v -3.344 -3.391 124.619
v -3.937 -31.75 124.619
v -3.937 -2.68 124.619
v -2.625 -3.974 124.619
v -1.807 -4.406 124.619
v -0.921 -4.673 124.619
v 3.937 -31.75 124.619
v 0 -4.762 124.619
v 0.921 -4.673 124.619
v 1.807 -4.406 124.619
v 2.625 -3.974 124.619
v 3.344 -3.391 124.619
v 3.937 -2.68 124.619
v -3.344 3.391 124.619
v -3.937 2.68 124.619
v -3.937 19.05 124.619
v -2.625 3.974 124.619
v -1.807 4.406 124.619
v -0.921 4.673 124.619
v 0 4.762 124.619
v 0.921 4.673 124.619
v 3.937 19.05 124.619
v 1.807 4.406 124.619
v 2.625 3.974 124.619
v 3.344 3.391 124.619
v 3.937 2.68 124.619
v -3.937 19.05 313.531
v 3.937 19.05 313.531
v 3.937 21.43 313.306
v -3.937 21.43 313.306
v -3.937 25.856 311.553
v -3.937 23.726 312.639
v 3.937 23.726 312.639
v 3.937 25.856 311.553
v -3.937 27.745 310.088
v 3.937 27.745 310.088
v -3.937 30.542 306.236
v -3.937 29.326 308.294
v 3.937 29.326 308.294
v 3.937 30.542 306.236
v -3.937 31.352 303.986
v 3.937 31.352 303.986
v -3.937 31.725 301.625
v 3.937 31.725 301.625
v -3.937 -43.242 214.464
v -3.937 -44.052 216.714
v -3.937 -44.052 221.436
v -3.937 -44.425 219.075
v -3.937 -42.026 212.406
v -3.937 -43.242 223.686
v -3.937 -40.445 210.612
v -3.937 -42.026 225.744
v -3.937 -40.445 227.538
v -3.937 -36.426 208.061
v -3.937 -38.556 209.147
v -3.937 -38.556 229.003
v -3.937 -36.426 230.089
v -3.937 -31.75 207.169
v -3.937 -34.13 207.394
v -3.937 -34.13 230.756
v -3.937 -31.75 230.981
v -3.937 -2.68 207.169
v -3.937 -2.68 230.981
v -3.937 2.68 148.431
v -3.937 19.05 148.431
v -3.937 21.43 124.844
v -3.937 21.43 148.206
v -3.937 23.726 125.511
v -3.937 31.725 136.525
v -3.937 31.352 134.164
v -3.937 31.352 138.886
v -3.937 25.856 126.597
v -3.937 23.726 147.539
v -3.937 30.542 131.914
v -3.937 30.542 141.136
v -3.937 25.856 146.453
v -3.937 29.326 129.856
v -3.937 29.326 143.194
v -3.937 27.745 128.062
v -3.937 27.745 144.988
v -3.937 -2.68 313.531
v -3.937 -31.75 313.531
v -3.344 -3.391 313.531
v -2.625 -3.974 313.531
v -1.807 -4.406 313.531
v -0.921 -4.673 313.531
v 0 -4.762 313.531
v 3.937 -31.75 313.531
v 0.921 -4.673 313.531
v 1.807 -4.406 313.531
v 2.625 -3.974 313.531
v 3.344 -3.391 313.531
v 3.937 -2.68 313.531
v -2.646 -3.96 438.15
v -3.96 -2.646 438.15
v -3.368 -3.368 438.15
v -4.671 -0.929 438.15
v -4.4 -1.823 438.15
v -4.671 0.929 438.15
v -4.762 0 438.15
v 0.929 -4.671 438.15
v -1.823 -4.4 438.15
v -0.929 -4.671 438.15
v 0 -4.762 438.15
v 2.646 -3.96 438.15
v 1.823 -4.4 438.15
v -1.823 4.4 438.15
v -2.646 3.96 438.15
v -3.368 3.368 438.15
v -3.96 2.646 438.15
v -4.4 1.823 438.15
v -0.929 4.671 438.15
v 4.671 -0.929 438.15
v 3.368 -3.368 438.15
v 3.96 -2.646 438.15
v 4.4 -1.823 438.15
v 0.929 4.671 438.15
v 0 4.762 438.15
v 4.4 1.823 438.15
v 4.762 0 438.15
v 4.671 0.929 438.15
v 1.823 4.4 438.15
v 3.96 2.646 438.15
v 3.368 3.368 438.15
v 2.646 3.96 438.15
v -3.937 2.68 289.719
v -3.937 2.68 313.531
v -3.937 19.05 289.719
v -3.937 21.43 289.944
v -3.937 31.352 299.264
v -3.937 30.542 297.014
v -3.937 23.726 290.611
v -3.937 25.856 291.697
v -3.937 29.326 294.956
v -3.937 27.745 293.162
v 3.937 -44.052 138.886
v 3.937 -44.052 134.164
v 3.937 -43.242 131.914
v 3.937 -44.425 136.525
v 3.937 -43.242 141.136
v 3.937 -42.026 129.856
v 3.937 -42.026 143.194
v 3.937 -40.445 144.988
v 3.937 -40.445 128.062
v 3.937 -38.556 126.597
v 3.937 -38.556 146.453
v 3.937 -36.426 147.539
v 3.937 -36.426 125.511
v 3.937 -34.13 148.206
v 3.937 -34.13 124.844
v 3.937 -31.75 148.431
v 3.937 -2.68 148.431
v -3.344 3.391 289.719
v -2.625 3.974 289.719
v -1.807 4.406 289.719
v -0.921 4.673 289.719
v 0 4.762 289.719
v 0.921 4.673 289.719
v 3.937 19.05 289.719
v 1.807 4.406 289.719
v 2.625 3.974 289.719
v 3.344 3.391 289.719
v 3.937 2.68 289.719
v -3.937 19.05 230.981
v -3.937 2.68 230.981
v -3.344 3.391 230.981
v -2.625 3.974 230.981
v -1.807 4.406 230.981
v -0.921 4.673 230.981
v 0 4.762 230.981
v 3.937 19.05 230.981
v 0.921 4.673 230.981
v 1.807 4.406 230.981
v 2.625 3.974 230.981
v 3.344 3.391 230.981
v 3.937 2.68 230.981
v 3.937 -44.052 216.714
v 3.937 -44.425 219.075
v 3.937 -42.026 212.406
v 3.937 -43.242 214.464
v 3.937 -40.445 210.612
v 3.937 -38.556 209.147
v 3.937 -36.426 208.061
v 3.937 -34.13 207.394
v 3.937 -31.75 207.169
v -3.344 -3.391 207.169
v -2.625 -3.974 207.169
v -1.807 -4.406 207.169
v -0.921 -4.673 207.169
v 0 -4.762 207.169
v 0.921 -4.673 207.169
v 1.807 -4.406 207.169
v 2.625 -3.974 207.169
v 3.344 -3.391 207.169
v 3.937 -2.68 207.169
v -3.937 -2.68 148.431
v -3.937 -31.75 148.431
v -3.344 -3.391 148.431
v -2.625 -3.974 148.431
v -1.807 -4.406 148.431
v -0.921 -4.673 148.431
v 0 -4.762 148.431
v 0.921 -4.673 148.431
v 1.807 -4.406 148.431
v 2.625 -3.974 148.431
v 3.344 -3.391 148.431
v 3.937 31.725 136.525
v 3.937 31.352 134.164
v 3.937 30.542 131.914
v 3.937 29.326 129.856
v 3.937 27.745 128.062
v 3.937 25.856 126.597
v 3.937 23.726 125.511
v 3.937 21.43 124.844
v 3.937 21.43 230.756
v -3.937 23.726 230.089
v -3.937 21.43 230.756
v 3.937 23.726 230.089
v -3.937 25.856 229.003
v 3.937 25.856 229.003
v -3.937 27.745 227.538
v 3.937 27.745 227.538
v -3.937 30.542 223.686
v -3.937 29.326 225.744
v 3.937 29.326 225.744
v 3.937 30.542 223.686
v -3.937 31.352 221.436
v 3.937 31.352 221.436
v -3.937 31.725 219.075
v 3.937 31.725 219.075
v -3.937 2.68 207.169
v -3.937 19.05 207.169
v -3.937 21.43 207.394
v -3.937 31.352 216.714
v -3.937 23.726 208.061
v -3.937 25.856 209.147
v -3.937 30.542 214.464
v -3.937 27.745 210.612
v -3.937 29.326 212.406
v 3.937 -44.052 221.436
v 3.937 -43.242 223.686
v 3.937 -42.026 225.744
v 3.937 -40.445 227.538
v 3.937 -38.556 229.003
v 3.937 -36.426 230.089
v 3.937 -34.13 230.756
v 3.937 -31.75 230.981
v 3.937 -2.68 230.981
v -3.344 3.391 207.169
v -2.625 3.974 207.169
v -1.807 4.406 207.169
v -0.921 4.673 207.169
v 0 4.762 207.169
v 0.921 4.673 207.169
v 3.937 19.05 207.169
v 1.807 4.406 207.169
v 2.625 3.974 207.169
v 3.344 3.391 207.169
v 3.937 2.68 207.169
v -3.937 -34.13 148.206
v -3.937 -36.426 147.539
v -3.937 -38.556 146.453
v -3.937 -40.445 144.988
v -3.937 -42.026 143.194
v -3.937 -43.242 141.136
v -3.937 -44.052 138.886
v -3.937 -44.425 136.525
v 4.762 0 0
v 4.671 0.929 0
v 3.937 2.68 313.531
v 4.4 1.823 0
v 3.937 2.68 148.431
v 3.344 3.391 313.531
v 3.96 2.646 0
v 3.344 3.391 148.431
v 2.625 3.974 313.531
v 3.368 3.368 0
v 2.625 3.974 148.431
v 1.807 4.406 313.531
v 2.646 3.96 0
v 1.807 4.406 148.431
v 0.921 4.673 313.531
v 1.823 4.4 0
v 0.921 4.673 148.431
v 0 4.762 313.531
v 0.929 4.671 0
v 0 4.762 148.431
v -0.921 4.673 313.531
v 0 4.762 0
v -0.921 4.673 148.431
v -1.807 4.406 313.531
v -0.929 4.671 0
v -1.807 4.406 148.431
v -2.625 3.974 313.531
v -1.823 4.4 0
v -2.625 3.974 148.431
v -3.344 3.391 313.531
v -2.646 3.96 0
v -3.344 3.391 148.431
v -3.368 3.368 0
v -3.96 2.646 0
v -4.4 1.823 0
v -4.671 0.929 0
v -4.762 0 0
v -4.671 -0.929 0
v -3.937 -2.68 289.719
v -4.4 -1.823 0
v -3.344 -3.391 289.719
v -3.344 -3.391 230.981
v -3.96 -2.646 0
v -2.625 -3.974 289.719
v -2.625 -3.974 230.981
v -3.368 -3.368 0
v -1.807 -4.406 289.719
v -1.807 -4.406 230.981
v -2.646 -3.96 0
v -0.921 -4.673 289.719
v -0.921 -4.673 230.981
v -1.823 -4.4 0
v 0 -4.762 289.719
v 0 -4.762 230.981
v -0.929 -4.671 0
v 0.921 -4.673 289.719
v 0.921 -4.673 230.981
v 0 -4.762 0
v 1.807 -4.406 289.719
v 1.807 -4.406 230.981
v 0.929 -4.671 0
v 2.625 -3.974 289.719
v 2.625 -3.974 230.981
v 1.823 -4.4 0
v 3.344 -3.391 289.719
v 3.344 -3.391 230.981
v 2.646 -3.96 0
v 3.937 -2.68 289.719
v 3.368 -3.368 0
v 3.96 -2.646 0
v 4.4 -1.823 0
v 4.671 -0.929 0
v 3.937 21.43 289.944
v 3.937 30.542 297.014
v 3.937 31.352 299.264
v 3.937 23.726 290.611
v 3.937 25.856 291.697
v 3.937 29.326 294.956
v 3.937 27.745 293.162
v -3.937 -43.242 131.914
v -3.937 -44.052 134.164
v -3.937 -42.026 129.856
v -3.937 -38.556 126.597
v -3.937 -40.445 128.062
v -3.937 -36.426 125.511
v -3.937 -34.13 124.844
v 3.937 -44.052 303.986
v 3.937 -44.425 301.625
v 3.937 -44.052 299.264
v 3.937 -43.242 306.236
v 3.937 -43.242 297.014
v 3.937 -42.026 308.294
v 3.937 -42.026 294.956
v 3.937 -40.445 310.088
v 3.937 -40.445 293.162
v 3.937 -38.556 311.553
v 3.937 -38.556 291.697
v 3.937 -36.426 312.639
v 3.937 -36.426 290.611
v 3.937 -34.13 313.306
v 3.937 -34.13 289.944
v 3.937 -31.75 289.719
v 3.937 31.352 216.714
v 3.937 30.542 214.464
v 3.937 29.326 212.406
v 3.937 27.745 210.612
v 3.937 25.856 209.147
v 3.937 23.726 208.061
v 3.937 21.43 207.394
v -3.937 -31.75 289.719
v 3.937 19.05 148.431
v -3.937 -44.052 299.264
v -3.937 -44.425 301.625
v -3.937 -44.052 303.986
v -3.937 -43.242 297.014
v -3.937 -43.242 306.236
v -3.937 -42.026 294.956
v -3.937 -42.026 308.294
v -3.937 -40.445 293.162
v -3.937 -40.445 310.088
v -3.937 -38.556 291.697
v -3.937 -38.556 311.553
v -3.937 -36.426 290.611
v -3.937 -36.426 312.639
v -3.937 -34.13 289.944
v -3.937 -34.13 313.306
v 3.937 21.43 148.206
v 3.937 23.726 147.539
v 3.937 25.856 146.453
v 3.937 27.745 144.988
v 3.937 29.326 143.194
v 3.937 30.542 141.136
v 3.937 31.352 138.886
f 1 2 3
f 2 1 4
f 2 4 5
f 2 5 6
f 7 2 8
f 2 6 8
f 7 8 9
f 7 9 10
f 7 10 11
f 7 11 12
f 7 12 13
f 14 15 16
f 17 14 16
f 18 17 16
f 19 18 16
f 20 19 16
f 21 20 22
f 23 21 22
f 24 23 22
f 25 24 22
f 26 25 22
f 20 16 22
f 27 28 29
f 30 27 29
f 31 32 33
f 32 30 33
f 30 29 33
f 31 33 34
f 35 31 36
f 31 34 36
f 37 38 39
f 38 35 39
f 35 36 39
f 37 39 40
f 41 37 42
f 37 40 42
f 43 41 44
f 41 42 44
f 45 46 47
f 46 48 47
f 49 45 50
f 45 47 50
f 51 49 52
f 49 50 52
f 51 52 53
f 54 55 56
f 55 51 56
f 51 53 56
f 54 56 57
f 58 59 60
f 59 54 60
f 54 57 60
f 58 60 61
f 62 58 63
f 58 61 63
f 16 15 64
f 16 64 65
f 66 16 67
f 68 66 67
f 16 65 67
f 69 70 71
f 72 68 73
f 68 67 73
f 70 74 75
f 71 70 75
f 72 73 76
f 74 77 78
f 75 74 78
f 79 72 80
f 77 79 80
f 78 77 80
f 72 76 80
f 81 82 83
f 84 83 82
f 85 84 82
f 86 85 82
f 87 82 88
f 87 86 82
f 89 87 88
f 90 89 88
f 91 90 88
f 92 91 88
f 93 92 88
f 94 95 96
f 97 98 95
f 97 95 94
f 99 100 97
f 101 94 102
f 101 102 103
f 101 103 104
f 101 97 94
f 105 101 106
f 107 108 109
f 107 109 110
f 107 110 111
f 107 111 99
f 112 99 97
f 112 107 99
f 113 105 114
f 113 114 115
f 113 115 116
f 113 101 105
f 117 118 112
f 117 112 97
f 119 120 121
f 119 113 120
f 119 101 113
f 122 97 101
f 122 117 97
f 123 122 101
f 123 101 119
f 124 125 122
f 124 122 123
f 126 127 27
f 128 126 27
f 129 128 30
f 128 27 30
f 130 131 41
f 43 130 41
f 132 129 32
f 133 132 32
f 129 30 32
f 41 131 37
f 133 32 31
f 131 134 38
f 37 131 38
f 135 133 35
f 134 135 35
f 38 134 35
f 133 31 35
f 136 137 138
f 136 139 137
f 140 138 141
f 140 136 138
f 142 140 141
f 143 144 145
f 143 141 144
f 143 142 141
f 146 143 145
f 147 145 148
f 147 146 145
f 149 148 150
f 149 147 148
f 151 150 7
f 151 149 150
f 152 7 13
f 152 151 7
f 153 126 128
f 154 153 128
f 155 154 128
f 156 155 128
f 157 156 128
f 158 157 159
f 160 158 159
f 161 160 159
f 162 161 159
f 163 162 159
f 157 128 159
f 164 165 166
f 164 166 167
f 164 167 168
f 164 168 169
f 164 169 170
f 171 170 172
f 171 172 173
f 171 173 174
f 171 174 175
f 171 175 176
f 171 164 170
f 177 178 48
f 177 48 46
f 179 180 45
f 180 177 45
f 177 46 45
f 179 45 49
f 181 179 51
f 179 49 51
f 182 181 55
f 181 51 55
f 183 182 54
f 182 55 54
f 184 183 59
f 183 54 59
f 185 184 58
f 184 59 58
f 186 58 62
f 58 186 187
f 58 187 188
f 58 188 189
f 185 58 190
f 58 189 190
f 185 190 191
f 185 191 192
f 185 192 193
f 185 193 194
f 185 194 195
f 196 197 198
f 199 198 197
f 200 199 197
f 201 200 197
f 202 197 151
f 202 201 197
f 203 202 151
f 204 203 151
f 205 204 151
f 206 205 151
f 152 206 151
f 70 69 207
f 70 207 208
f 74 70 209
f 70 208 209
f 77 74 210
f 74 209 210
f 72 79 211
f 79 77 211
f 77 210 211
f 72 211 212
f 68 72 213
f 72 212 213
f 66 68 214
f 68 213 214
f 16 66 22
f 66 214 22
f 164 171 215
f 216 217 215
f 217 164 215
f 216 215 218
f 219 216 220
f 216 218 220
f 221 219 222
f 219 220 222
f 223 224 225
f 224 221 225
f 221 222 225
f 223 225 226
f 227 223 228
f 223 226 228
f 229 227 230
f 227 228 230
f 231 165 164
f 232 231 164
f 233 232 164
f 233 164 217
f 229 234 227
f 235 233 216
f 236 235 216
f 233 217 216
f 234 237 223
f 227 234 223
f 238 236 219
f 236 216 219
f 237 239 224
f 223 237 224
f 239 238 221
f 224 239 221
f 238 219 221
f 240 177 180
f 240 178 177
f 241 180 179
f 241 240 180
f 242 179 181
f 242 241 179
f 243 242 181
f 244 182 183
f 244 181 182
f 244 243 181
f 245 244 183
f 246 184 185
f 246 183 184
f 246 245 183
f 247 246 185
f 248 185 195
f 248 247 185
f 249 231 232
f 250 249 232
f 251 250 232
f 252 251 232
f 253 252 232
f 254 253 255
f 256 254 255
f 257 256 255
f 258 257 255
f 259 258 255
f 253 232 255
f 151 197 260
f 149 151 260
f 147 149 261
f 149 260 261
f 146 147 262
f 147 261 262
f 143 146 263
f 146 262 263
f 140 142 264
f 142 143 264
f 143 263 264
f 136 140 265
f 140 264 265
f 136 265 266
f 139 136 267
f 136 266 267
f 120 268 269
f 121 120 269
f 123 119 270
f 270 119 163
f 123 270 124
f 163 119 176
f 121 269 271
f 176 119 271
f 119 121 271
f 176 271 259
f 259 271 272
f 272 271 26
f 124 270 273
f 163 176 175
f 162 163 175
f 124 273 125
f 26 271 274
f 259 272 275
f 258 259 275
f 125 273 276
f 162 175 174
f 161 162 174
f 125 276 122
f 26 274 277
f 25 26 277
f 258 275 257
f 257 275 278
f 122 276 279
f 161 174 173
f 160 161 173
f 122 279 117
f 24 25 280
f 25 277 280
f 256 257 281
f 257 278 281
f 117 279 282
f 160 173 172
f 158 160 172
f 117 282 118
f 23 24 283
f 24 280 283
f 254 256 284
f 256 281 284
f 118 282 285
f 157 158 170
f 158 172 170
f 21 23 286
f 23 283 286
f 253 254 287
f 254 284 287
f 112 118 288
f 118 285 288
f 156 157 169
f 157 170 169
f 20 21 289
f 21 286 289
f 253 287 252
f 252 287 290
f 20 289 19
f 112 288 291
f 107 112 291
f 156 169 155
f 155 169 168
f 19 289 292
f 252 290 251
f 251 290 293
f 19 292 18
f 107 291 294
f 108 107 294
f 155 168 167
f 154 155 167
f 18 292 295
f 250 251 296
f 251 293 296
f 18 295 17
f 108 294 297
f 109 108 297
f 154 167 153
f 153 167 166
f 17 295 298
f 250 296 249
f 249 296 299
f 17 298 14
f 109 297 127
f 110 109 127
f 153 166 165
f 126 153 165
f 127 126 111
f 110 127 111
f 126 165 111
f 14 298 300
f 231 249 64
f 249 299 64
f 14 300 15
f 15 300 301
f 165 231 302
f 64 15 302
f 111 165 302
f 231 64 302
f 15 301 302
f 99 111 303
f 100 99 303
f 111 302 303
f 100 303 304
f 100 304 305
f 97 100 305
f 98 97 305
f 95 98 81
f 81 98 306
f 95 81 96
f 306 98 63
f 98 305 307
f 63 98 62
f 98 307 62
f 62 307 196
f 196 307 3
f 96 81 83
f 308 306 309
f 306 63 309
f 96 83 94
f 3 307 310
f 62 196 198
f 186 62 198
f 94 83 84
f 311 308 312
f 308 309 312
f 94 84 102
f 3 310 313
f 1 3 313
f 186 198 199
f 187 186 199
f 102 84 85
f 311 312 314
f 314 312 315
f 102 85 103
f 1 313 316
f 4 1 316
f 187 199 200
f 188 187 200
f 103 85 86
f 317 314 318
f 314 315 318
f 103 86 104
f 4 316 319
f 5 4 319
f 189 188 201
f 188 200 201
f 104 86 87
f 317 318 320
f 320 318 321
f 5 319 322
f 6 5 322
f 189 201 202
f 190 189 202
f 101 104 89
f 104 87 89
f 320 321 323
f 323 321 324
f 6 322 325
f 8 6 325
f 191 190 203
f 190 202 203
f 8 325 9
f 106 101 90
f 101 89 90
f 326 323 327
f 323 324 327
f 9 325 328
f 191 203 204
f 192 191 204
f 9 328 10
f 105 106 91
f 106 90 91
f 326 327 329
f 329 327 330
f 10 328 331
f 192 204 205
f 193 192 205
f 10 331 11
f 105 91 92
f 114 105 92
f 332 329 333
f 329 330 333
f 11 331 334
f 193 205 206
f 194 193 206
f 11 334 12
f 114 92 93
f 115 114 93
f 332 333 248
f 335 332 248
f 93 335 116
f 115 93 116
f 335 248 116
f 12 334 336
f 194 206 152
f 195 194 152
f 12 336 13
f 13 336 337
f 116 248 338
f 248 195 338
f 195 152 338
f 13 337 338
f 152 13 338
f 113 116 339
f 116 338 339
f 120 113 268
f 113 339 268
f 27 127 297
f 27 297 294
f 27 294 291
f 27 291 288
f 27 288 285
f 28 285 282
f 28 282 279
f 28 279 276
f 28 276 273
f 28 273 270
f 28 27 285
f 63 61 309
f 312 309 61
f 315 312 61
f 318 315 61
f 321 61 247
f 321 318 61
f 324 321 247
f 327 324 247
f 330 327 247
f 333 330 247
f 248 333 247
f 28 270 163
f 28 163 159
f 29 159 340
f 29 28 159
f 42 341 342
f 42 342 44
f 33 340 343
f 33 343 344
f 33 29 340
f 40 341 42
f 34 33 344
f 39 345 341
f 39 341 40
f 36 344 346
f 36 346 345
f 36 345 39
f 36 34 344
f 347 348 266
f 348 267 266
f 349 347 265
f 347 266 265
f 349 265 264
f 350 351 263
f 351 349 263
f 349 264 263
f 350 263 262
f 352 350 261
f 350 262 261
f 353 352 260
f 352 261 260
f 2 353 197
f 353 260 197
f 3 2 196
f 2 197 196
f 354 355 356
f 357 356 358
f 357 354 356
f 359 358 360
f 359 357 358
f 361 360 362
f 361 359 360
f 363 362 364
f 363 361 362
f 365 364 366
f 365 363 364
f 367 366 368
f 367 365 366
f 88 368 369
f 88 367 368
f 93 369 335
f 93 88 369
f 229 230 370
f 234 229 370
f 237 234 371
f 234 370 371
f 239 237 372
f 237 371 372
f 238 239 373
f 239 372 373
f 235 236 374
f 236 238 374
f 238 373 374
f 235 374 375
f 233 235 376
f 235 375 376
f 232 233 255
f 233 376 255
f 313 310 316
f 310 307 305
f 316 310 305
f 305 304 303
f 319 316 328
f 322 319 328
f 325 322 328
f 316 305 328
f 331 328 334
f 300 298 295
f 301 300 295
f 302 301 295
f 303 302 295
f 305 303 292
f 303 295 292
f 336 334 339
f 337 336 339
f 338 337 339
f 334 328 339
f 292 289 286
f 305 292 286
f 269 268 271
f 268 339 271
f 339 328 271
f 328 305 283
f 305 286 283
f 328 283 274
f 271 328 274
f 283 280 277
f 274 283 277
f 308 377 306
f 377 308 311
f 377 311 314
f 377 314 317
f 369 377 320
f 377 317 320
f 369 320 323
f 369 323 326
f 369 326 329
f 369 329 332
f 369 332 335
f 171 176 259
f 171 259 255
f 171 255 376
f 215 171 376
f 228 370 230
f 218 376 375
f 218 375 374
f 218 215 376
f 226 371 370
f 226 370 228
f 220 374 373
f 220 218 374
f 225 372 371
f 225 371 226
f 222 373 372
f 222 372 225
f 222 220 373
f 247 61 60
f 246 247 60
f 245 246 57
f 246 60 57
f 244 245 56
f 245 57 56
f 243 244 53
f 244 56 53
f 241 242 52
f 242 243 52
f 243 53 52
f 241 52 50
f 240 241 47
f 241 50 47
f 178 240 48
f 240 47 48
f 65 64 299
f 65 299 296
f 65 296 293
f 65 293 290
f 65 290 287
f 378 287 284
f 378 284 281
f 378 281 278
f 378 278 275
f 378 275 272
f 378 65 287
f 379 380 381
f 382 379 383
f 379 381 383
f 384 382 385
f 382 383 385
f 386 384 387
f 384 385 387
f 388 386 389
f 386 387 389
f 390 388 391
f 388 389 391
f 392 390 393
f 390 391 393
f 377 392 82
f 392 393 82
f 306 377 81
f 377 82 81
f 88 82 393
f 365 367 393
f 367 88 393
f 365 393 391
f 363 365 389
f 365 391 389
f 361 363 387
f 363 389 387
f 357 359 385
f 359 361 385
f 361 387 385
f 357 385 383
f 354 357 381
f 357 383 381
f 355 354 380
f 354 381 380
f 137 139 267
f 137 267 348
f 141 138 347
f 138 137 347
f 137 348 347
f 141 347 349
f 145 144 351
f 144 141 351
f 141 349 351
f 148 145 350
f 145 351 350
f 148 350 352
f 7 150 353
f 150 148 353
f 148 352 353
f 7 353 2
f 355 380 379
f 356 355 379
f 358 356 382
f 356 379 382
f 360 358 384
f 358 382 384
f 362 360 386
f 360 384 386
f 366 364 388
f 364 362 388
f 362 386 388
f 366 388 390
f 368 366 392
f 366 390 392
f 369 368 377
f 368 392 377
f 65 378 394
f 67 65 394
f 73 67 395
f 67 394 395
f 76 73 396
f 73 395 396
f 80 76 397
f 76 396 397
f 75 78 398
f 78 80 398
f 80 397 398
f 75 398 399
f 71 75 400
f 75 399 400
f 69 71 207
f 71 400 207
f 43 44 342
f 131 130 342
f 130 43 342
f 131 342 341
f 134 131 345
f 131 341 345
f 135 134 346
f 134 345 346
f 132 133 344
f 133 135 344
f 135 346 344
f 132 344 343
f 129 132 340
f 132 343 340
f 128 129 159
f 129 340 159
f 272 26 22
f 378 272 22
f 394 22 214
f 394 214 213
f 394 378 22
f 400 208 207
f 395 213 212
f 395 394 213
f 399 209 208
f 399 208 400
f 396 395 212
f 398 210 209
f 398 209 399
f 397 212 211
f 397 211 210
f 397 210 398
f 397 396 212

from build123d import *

# Parameters (mm, degrees)
SKETCH1_R              = 4.7625
BOSS_EXTRUDE1_DEPTH    = 438.15
SKETCH2_W              = 7.873653068
SKETCH2_H              = 76.2
BOSS_EXTRUDE2_DEPTH    = 11.90625
FILLET1_R              = 12.7
LPATTERN1_COUNT        = 2
LPATTERN1_PITCH        = 82.55
LPATTERN1_COUNT_DIR2   = 2
LPATTERN1_PITCH_DIR2   = 82.55
FILLET1_OF_LPATTERN1_R = 12.7


with BuildPart() as part:
    # Sketch1 → Boss-Extrude1 (new body)
    with BuildSketch(Plane.XY):
        Circle(SKETCH1_R)
    extrude(amount=BOSS_EXTRUDE1_DEPTH)

    # Sketch2 → Boss-Extrude2 (add, symmetric)
    with BuildSketch(Plane.XY.offset(219.075)):
        with Locations((0, -6.35)):
            Rectangle(SKETCH2_W, SKETCH2_H)
    boss_extrude2 = extrude(amount=BOSS_EXTRUDE2_DEPTH, both=True)

    # Fillet1
    # the kernel refuses this fillet: 12.7 mm, written as the material it takes off along each edge
    with BuildSketch(Plane(origin=(35.686826534, 31.75, 207.16875), x_dir=(0, -1, 0), z_dir=(-1, 0, 0)), Plane(origin=(-35.686826534, -44.45, 207.16875), x_dir=(0, 1, 0), z_dir=(1, 0, 0))) as fillet1_piece_1:
        with BuildLine():
            CenterArc((FILLET1_R, FILLET1_R), FILLET1_R, 180, 90)
            Line((0, FILLET1_R), (0, 0))
            Line((0, 0), (FILLET1_R, 0))
        make_face()
    extrude(amount=71.373653068, mode=Mode.SUBTRACT)
    with BuildSketch(Plane(origin=(35.686826534, 31.75, 230.98125), x_dir=(0, -1, 0), z_dir=(-1, 0, 0)), Plane(origin=(-35.686826534, -44.45, 230.98125), x_dir=(0, 1, 0), z_dir=(1, 0, 0))) as fillet1_piece_2:
        with BuildLine():
            CenterArc((FILLET1_R, -FILLET1_R), FILLET1_R, 90, 90)
            Line((0, -FILLET1_R), (0, 0))
            Line((0, 0), (FILLET1_R, 0))
        make_face()
    extrude(amount=71.373653068, mode=Mode.SUBTRACT)

    # LPattern1: Boss-Extrude2 2 × 2
    with Locations(*[Vector(0, 0, 1) * (i * LPATTERN1_PITCH) + Vector(0, 0, -1) * (j * LPATTERN1_PITCH_DIR2) for i in range(LPATTERN1_COUNT) for j in range(LPATTERN1_COUNT_DIR2) if (i, j) != (0, 0)]):
        add(boss_extrude2)

    # Fillet1 of LPattern1
    # the kernel refuses this fillet: 12.7 mm, written as the material it takes off along each edge
    with BuildSketch(Plane(origin=(35.686826534, 31.75, 124.61875), x_dir=(0, 0, 1), z_dir=(-1, 0, 0)), Plane(origin=(35.686826534, 31.75, 289.71875), x_dir=(0, 0, 1), z_dir=(-1, 0, 0)), Plane(origin=(35.686826534, 31.75, 313.53125), x_dir=(0, -1, 0), z_dir=(-1, 0, 0)), Plane(origin=(-35.686826534, -44.45, 289.71875), x_dir=(0, 0, 1), z_dir=(1, 0, 0)), Plane(origin=(35.686826534, 31.75, 207.16875), x_dir=(0, 0, 1), z_dir=(-1, 0, 0))) as fillet1_of_lpattern1_piece_1:
        with BuildLine():
            CenterArc((FILLET1_OF_LPATTERN1_R, -FILLET1_OF_LPATTERN1_R), FILLET1_OF_LPATTERN1_R, 90, 90)
            Line((0, -FILLET1_OF_LPATTERN1_R), (0, 0))
            Line((0, 0), (FILLET1_OF_LPATTERN1_R, 0))
        make_face()
    extrude(amount=71.373653068, mode=Mode.SUBTRACT)
    with BuildSketch(Plane(origin=(35.686826534, 31.75, 148.43125), x_dir=(0, 0, -1), z_dir=(-1, 0, 0)), Plane(origin=(-35.686826534, -44.45, 148.43125), x_dir=(0, 0, -1), z_dir=(1, 0, 0)), Plane(origin=(-35.686826534, -44.45, 124.61875), x_dir=(0, 1, 0), z_dir=(1, 0, 0)), Plane(origin=(-35.686826534, -44.45, 313.53125), x_dir=(0, 0, -1), z_dir=(1, 0, 0)), Plane(origin=(35.686826534, 31.75, 230.98125), x_dir=(0, 0, -1), z_dir=(-1, 0, 0)), Plane(origin=(-35.686826534, -44.45, 230.98125), x_dir=(0, 0, -1), z_dir=(1, 0, 0)), Plane(origin=(-35.686826534, -44.45, 207.16875), x_dir=(0, 1, 0), z_dir=(1, 0, 0))) as fillet1_of_lpattern1_piece_2:
        with BuildLine():
            CenterArc((FILLET1_OF_LPATTERN1_R, FILLET1_OF_LPATTERN1_R), FILLET1_OF_LPATTERN1_R, 180, 90)
            Line((0, FILLET1_OF_LPATTERN1_R), (0, 0))
            Line((0, 0), (FILLET1_OF_LPATTERN1_R, 0))
        make_face()
    extrude(amount=71.373653068, mode=Mode.SUBTRACT)


solid = part.part
